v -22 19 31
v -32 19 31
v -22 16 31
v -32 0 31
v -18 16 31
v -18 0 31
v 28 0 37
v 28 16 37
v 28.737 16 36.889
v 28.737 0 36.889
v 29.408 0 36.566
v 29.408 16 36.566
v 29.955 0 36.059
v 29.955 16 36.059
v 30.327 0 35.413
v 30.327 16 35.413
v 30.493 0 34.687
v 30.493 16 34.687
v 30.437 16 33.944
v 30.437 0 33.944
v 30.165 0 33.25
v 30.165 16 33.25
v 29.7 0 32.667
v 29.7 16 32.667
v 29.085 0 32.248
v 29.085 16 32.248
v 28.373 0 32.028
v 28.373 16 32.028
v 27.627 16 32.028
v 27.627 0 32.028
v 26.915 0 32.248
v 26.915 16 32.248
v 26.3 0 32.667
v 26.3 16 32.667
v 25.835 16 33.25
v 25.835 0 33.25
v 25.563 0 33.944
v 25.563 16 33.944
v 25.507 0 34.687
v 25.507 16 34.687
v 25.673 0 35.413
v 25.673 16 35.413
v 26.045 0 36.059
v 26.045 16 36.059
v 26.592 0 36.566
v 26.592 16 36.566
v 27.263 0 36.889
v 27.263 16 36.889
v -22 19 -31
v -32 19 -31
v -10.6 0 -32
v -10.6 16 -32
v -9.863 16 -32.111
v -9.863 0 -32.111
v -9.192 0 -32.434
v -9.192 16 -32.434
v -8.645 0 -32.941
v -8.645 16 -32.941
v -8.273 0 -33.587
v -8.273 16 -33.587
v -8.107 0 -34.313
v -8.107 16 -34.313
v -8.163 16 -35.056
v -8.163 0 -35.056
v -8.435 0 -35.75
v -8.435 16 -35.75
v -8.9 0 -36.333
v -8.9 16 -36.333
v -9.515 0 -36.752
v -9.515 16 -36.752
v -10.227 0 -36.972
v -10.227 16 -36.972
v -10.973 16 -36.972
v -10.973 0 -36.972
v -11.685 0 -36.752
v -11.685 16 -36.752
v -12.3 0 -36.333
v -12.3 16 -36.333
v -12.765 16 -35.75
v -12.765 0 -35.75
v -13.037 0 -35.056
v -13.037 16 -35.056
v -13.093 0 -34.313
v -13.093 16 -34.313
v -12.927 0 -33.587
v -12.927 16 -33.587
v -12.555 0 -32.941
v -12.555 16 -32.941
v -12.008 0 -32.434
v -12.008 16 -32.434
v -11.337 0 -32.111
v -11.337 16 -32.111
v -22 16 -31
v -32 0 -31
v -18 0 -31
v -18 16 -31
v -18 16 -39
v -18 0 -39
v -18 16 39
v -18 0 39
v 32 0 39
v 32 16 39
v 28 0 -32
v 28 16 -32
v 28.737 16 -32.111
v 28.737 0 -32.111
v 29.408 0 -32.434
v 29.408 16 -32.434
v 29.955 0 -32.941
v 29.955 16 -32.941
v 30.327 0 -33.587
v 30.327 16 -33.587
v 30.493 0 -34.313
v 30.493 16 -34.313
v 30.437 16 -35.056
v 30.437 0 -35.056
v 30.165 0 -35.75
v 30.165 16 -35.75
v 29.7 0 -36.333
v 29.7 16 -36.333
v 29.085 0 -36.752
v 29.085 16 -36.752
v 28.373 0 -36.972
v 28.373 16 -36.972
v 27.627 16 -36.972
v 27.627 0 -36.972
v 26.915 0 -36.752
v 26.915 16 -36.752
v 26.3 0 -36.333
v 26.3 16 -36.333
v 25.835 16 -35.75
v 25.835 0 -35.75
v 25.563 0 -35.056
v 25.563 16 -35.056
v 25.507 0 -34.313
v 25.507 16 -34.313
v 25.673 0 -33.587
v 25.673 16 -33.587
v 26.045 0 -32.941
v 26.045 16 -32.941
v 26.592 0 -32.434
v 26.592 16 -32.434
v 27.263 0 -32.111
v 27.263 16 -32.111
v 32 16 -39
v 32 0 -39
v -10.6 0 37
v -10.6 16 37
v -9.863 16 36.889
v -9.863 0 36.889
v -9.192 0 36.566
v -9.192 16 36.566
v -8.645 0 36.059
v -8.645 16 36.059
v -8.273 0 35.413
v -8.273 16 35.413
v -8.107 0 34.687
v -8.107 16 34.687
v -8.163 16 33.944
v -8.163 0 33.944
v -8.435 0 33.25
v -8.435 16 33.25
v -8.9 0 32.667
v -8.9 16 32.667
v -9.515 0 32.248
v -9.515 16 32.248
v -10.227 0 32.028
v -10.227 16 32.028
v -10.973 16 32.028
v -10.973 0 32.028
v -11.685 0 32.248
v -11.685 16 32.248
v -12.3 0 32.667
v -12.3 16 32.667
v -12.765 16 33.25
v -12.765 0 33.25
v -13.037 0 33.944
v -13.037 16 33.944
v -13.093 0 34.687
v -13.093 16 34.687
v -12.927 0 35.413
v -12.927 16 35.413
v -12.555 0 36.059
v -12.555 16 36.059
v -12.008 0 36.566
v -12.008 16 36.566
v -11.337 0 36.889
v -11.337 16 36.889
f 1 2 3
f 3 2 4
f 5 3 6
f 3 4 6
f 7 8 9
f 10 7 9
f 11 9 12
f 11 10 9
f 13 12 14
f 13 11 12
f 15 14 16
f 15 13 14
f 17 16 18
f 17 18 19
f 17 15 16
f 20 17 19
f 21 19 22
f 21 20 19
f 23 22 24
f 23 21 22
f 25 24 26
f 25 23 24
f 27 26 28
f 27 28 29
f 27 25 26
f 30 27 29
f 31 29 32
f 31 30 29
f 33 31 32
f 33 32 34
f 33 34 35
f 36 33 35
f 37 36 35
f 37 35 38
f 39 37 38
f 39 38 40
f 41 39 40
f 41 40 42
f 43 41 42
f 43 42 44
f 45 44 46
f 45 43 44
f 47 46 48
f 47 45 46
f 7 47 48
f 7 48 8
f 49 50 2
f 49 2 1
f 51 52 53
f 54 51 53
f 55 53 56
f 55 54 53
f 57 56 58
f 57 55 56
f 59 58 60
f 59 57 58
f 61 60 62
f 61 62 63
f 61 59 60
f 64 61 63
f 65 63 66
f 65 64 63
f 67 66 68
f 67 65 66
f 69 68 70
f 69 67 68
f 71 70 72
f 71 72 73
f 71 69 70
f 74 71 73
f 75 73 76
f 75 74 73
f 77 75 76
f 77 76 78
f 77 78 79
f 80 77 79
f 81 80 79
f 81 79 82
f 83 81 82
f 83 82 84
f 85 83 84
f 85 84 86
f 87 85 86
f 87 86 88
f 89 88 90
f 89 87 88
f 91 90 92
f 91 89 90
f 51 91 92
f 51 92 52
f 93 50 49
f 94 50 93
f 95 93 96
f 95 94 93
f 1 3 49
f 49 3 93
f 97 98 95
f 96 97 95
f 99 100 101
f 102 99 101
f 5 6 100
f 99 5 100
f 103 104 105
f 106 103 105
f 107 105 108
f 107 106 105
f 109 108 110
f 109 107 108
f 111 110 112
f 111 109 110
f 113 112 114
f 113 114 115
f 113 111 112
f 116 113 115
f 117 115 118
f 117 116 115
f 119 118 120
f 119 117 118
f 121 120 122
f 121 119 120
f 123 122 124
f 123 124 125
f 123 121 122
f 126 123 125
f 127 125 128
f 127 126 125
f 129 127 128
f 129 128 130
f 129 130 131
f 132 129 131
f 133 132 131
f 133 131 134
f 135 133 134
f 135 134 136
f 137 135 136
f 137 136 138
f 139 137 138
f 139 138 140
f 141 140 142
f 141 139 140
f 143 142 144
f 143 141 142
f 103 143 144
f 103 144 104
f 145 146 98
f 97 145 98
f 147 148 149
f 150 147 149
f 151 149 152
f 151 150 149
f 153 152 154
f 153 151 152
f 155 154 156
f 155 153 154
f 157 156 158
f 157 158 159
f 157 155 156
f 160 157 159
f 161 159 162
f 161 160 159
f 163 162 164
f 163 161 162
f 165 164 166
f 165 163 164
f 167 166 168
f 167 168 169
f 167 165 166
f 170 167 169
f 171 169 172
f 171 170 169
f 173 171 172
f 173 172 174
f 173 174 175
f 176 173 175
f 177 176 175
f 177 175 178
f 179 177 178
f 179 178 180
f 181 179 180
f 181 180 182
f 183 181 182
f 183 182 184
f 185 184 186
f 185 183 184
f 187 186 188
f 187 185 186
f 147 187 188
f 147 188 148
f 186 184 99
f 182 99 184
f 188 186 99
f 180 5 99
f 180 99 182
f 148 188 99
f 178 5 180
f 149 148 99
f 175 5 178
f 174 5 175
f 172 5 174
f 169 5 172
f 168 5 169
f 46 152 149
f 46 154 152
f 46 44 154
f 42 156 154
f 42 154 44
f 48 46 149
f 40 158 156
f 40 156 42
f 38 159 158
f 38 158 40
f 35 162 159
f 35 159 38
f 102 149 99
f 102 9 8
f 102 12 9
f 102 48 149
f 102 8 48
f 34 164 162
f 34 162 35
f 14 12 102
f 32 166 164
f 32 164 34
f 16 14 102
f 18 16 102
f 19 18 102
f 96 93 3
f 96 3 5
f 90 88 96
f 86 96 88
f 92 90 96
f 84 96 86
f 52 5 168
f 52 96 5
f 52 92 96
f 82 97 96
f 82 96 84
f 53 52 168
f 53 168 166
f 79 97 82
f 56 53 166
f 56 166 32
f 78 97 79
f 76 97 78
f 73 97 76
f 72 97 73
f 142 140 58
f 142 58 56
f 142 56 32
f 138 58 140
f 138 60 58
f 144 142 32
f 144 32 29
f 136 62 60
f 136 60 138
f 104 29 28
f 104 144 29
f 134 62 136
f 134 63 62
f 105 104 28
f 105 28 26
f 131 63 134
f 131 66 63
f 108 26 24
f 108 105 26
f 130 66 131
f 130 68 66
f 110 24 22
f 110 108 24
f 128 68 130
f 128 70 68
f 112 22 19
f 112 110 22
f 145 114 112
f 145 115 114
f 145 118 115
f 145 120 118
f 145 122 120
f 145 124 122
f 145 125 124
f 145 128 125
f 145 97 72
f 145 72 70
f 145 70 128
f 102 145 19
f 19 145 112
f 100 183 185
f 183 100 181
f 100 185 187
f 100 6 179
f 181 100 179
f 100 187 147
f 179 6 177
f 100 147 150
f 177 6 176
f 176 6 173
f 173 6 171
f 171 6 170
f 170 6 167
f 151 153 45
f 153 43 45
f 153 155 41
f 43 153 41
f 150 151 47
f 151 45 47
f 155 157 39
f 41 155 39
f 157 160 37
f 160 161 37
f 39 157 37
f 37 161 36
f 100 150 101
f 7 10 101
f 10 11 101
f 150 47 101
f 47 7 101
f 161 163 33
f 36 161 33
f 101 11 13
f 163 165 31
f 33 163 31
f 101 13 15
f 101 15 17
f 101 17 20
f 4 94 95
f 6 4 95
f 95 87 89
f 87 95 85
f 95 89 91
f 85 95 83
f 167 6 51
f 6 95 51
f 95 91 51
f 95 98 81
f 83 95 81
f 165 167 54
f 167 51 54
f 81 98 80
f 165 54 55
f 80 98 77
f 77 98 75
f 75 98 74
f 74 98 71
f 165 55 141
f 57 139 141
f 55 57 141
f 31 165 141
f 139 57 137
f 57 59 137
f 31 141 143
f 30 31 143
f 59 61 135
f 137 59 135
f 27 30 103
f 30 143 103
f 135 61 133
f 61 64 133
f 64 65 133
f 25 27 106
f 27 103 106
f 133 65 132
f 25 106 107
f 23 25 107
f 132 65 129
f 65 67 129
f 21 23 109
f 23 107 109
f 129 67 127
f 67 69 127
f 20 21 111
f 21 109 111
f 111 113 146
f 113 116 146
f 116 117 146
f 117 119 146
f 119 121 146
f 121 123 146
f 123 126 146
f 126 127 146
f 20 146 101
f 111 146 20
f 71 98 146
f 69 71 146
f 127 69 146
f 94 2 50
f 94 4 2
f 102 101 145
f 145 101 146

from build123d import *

# Parameters (mm, degrees)
SKETCH_2_R      = 2.5
EXTRUDE_2_DEPTH = 16
SKETCH_5_W      = 10
SKETCH_5_H      = 62
EXTRUDE_3_DEPTH = 3


with BuildPart() as part:
    # 草图2 → 凸台-拉伸2 (new body)
    with BuildSketch(Plane(origin=(0, 0, 0), x_dir=(1, 0, 0), z_dir=(0, 1, 0))):
        Polygon((-18, 39), (-18, 31), (-32, 31), (-32, -31), (-18, -31), (-18, -39), (32, -39), (32, 39), align=None)
        with Locations(Location((28, 34.5, 0), (0, 0, 270))):
            Circle(SKETCH_2_R, mode=Mode.SUBTRACT)
        with Locations(Location((-10.6, 34.5, 0), (0, 0, 270))):
            Circle(SKETCH_2_R, mode=Mode.SUBTRACT)
        with Locations(Location((28, -34.5, 0), (0, 0, 270))):
            Circle(SKETCH_2_R, mode=Mode.SUBTRACT)
        with Locations(Location((-10.6, -34.5, 0), (0, 0, 270))):
            Circle(SKETCH_2_R, mode=Mode.SUBTRACT)
    extrude(amount=EXTRUDE_2_DEPTH)

    # 草图5 → 凸台-拉伸3 (add)
    with BuildSketch(Plane(origin=(0, 16, 0), x_dir=(1, 0, 0), z_dir=(0, 1, 0))):
        with Locations((-27, 0)):
            Rectangle(SKETCH_5_W, SKETCH_5_H)
    extrude(amount=EXTRUDE_3_DEPTH)


solid = part.part
